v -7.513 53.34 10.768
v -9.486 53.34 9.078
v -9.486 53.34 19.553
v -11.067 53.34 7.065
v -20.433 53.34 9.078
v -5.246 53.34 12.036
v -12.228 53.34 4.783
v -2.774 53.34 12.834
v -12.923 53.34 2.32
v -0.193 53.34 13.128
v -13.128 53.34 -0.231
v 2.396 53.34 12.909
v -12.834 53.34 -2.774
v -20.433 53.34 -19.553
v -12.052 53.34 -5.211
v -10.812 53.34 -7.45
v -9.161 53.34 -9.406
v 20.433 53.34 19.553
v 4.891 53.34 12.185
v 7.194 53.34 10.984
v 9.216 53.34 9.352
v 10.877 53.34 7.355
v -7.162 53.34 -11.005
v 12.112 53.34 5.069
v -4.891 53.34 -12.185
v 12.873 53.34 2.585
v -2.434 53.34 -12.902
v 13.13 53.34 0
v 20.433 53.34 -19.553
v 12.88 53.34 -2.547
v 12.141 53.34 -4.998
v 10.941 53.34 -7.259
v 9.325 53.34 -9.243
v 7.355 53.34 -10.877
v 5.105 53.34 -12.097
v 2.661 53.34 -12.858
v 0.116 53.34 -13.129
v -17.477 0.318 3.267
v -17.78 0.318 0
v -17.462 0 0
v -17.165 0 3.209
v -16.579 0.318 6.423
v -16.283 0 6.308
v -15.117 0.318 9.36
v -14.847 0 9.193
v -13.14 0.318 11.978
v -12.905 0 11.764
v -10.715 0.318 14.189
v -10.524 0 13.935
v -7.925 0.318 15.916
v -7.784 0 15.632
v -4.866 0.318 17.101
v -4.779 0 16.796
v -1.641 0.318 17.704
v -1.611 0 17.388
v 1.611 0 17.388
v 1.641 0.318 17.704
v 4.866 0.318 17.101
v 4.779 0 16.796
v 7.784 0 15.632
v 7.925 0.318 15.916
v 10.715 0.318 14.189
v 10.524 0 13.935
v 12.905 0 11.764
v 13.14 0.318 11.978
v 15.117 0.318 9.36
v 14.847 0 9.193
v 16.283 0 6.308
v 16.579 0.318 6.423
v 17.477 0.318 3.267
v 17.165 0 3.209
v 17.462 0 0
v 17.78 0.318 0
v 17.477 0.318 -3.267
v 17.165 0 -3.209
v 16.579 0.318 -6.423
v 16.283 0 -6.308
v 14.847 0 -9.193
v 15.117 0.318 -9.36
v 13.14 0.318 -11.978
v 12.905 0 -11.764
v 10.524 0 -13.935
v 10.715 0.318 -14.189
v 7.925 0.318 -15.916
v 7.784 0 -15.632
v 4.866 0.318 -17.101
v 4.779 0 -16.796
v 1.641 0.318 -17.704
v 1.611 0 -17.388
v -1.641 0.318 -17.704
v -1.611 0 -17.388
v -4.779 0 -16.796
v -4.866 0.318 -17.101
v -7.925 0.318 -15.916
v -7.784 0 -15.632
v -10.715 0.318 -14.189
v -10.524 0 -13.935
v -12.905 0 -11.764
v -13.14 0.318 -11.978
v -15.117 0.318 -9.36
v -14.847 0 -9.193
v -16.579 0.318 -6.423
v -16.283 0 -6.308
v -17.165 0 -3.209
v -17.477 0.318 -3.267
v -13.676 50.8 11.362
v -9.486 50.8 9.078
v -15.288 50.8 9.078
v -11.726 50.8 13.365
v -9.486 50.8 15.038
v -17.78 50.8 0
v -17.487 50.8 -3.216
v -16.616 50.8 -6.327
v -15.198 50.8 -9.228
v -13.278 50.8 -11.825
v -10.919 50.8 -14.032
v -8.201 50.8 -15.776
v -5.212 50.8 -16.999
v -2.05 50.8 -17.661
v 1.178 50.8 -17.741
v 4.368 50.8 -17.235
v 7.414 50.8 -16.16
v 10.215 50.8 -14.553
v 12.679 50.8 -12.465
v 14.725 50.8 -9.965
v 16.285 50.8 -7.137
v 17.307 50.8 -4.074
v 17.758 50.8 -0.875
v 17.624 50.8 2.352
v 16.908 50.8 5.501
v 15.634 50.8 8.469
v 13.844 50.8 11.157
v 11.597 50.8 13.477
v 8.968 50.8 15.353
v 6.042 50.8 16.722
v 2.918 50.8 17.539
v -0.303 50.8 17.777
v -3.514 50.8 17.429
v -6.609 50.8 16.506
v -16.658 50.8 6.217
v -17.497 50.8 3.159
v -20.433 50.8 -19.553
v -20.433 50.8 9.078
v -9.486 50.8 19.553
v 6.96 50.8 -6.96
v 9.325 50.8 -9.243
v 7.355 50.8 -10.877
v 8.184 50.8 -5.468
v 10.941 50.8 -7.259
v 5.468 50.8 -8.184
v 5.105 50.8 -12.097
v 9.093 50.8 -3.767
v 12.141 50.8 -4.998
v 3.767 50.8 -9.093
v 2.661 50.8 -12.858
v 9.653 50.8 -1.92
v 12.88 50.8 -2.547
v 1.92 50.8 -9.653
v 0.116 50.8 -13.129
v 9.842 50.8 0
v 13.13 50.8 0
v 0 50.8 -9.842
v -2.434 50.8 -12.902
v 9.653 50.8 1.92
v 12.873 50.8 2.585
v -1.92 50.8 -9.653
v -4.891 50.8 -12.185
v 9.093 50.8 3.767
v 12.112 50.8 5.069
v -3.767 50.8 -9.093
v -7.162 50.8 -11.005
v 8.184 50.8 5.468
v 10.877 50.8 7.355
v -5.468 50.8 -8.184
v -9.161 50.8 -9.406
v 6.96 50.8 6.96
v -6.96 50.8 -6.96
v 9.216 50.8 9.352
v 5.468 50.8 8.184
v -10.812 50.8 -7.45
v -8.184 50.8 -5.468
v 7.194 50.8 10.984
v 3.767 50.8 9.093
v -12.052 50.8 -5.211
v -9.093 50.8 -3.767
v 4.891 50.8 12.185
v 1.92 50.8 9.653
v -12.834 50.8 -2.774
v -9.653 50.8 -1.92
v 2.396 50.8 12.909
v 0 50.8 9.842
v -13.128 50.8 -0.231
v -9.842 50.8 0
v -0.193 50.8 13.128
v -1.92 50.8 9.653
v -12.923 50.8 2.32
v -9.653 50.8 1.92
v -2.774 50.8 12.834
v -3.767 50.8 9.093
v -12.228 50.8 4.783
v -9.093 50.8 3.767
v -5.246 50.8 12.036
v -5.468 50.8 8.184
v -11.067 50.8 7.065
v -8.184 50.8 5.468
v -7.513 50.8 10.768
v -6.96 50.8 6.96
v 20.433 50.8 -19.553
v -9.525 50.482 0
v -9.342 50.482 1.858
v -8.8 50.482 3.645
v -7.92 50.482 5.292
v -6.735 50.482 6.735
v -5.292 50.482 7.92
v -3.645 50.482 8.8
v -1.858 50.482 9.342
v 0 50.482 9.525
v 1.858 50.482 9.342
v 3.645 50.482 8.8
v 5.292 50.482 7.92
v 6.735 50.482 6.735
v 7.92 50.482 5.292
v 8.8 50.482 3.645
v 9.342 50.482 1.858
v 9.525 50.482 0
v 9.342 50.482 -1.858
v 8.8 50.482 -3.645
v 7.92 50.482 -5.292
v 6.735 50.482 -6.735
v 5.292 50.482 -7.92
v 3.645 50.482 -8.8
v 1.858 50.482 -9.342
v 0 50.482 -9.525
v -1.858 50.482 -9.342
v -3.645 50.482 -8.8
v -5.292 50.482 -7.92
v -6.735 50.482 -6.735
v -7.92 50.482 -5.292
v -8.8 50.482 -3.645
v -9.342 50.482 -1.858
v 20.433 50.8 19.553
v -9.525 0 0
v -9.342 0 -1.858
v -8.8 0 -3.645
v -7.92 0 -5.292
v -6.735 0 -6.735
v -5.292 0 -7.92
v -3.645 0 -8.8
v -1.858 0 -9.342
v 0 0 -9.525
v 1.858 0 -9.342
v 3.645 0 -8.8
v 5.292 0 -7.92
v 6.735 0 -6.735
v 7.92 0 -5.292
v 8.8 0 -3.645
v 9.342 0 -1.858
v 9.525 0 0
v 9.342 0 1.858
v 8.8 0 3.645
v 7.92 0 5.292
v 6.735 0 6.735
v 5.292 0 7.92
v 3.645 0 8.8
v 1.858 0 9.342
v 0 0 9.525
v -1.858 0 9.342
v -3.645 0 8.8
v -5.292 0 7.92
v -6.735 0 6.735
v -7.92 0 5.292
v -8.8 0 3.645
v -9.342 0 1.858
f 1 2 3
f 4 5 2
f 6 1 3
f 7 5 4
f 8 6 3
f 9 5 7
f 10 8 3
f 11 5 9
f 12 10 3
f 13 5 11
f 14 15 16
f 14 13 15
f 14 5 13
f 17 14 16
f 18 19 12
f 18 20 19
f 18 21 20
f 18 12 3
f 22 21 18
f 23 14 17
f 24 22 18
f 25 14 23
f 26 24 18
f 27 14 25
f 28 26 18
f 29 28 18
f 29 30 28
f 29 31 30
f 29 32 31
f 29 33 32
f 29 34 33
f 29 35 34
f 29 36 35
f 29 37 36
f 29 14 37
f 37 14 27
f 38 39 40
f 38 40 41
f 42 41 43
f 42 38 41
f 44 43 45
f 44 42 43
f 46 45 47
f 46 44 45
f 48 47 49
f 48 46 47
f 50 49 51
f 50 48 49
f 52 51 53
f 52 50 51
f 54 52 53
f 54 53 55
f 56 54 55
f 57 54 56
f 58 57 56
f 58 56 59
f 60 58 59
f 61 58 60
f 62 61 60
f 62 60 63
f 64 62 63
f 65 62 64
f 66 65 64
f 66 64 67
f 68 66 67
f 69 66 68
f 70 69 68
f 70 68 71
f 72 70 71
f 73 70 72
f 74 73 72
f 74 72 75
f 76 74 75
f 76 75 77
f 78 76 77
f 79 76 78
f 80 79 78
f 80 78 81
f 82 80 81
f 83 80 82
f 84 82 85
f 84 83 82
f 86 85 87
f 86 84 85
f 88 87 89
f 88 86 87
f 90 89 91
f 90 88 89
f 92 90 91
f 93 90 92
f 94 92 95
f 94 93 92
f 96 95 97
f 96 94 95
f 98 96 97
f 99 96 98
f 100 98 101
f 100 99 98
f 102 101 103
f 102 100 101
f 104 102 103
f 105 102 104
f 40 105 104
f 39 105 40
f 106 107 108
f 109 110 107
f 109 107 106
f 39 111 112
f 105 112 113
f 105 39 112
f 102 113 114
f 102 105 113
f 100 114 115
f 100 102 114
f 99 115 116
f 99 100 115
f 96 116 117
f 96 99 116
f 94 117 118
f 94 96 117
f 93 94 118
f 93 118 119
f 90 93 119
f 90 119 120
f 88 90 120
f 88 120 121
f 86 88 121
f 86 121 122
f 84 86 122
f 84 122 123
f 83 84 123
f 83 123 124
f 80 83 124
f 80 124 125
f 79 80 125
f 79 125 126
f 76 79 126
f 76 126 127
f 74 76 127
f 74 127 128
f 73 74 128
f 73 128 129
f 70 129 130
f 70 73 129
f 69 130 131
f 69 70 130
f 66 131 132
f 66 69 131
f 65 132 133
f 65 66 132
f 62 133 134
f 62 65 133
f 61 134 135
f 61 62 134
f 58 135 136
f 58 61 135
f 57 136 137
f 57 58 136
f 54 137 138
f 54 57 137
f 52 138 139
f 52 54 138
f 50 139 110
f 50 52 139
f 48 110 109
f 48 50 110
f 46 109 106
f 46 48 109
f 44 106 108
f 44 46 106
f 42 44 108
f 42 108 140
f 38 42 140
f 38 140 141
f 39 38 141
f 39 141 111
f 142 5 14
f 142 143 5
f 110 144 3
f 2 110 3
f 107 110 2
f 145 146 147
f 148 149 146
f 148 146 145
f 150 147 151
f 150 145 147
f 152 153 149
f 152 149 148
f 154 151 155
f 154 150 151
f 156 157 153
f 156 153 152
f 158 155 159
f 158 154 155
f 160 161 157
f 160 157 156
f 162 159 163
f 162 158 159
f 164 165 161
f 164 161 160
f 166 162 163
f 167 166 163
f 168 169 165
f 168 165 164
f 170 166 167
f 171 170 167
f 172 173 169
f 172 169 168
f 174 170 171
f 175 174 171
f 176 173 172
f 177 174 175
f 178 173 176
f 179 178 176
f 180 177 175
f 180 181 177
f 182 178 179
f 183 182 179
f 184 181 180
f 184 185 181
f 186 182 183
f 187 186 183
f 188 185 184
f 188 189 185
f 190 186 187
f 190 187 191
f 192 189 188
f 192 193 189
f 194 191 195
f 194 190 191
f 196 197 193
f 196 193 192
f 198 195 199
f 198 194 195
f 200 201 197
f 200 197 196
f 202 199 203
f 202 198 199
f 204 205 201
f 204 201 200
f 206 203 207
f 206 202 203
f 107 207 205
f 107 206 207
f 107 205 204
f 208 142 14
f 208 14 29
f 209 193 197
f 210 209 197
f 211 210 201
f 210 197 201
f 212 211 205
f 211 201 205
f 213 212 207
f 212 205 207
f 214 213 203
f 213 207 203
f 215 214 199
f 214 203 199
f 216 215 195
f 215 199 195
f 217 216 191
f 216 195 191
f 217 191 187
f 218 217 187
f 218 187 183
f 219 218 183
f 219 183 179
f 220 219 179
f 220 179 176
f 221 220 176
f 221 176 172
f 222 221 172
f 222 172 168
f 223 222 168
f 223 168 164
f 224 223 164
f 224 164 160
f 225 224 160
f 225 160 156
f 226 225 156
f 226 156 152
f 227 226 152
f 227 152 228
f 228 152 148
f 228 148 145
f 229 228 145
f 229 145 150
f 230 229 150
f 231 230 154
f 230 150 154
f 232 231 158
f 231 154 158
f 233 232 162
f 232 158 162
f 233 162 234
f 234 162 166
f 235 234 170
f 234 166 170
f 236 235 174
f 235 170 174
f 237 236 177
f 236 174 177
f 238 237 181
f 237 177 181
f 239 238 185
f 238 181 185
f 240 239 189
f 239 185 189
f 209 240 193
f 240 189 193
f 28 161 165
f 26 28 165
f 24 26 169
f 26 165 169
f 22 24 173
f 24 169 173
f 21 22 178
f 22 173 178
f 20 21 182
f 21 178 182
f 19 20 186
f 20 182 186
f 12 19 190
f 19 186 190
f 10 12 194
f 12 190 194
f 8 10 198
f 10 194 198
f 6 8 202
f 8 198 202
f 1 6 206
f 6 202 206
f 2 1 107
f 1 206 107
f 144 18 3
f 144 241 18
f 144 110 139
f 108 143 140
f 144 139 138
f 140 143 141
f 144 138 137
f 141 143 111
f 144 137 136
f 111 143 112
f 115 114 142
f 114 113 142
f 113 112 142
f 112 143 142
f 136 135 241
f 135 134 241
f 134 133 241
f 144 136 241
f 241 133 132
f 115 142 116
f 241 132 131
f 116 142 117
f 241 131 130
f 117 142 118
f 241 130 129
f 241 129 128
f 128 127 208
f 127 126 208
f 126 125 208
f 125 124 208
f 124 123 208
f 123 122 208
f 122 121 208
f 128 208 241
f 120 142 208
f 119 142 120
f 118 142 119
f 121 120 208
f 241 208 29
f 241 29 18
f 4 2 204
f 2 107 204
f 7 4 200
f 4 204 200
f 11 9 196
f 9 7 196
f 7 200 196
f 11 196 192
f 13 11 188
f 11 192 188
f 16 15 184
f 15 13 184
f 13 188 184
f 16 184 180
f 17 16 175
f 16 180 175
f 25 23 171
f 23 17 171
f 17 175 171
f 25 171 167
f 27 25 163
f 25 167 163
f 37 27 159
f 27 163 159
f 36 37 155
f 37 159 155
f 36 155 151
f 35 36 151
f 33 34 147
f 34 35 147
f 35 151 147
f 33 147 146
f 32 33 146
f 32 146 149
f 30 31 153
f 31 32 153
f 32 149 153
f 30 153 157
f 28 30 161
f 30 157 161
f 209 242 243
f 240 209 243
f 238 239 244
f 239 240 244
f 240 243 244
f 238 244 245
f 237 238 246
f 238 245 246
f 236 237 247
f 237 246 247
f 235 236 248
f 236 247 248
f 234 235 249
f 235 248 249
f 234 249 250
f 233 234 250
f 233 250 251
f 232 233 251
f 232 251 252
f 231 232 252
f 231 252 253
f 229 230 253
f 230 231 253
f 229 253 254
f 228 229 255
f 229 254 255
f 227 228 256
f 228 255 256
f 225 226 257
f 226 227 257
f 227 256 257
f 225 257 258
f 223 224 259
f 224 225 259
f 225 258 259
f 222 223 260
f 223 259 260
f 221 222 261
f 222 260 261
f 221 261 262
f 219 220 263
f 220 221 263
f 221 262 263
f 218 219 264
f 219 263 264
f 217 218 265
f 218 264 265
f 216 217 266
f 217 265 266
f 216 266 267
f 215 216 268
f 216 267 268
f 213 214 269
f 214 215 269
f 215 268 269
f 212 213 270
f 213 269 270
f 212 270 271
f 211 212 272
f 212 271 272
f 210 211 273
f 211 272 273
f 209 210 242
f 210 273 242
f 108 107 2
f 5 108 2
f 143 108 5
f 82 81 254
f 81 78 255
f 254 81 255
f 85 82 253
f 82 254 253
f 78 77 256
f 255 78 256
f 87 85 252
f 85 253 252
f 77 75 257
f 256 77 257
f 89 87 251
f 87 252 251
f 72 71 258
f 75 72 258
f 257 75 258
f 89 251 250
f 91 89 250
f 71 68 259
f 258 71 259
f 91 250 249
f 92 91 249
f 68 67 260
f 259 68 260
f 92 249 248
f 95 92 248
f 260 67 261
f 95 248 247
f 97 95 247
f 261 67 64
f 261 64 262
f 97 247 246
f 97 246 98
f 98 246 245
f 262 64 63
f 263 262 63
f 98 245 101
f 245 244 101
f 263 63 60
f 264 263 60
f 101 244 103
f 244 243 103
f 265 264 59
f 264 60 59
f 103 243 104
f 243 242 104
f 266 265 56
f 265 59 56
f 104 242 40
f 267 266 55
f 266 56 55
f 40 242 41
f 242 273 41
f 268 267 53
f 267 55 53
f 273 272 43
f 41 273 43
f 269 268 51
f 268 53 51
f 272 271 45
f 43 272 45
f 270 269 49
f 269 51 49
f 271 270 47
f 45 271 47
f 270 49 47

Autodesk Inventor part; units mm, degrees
ref_plane "YZ Plane" through (0, 0, 0) normal (1, 0, 0) x (0, 1, 0)
ref_plane "XZ Plane" through (0, 0, 0) normal (0, 1, 0) x (-1, 0, 0)
ref_plane "XY Plane" through (0, 0, 0) normal (0, 0, 1) x (1, 0, 0)
sketch "Sketch1" plane through (0, 0, 0) normal (0, 1, 0) x (-1, 0, 0)
  point P0 (0, 0)
sketch "Sketch2" plane through (0, 0, 0) normal (0, 1, 0) x (-1, 0, 0)
  circle A0 centre (0, 0) radius 17.78
  circle A1 centre (0, 0) radius 9.525
  dimension "d0" = 35.56
  dimension "d1" = 19.05
extrude "Extrusion1" add sketch "Sketch2" along normal blind 50.8
chamfer "Chamfer1" distance 0.3175 angle 45 2 edges at (9.525, 50.8, 0) (17.78, 0, 0)
sketch "Sketch3" plane through (0, 50.8, 0) normal (0, 1, 0) x (1, 0, 0)
  line L0 (-20.433, 19.5533) -> (20.433, 19.5533)
  line L1 (20.433, 19.5533) -> (20.433, -19.5533)
  line L2 (20.433, -19.5533) -> (-20.433, -19.5533)
  line L3 (-20.433, -19.5533) -> (-20.433, 19.5533)
  line L4 (-20.433, 19.5533) -> (20.433, -19.5533) construction
  line L5 (20.433, 19.5533) -> (-20.433, -19.5533) construction
  line L6 (-14.9596, 14.3155) -> (14.9596, 14.3155)
  line L7 (14.9596, 14.3155) -> (14.9596, -14.3155)
  line L8 (14.9596, -14.3155) -> (-14.9596, -14.3155)
  line L9 (-14.9596, -14.3155) -> (-14.9596, 14.3155)
  line L10 (-14.9596, 14.3155) -> (14.9596, -14.3155) construction
  line L11 (14.9596, 14.3155) -> (-14.9596, -14.3155) construction
  line L12 (-9.4862, -9.0778) -> (-20.433, -9.0778)
  line L13 (-20.433, -9.0778) -> (-20.433, -19.5533)
  line L14 (-20.433, -19.5533) -> (-9.4862, -19.5533)
  line L15 (-9.4862, -19.5533) -> (-9.4862, -9.0778)
  line L16 (-9.4862, -9.0778) -> (-20.433, -19.5533) construction
  line L17 (-20.433, -9.0778) -> (-9.4862, -19.5533) construction
  circle A0 centre (0, 0) radius 13.1299
extrude "Extrusion2" add sketch "Sketch3" along normal blind 2.54 contours L0 L1 L2 L15 L8 L7 L6 L9 L12 L3 | L9 L6 L7 L8 L15 L12
properties part number "Wheel Washer"
